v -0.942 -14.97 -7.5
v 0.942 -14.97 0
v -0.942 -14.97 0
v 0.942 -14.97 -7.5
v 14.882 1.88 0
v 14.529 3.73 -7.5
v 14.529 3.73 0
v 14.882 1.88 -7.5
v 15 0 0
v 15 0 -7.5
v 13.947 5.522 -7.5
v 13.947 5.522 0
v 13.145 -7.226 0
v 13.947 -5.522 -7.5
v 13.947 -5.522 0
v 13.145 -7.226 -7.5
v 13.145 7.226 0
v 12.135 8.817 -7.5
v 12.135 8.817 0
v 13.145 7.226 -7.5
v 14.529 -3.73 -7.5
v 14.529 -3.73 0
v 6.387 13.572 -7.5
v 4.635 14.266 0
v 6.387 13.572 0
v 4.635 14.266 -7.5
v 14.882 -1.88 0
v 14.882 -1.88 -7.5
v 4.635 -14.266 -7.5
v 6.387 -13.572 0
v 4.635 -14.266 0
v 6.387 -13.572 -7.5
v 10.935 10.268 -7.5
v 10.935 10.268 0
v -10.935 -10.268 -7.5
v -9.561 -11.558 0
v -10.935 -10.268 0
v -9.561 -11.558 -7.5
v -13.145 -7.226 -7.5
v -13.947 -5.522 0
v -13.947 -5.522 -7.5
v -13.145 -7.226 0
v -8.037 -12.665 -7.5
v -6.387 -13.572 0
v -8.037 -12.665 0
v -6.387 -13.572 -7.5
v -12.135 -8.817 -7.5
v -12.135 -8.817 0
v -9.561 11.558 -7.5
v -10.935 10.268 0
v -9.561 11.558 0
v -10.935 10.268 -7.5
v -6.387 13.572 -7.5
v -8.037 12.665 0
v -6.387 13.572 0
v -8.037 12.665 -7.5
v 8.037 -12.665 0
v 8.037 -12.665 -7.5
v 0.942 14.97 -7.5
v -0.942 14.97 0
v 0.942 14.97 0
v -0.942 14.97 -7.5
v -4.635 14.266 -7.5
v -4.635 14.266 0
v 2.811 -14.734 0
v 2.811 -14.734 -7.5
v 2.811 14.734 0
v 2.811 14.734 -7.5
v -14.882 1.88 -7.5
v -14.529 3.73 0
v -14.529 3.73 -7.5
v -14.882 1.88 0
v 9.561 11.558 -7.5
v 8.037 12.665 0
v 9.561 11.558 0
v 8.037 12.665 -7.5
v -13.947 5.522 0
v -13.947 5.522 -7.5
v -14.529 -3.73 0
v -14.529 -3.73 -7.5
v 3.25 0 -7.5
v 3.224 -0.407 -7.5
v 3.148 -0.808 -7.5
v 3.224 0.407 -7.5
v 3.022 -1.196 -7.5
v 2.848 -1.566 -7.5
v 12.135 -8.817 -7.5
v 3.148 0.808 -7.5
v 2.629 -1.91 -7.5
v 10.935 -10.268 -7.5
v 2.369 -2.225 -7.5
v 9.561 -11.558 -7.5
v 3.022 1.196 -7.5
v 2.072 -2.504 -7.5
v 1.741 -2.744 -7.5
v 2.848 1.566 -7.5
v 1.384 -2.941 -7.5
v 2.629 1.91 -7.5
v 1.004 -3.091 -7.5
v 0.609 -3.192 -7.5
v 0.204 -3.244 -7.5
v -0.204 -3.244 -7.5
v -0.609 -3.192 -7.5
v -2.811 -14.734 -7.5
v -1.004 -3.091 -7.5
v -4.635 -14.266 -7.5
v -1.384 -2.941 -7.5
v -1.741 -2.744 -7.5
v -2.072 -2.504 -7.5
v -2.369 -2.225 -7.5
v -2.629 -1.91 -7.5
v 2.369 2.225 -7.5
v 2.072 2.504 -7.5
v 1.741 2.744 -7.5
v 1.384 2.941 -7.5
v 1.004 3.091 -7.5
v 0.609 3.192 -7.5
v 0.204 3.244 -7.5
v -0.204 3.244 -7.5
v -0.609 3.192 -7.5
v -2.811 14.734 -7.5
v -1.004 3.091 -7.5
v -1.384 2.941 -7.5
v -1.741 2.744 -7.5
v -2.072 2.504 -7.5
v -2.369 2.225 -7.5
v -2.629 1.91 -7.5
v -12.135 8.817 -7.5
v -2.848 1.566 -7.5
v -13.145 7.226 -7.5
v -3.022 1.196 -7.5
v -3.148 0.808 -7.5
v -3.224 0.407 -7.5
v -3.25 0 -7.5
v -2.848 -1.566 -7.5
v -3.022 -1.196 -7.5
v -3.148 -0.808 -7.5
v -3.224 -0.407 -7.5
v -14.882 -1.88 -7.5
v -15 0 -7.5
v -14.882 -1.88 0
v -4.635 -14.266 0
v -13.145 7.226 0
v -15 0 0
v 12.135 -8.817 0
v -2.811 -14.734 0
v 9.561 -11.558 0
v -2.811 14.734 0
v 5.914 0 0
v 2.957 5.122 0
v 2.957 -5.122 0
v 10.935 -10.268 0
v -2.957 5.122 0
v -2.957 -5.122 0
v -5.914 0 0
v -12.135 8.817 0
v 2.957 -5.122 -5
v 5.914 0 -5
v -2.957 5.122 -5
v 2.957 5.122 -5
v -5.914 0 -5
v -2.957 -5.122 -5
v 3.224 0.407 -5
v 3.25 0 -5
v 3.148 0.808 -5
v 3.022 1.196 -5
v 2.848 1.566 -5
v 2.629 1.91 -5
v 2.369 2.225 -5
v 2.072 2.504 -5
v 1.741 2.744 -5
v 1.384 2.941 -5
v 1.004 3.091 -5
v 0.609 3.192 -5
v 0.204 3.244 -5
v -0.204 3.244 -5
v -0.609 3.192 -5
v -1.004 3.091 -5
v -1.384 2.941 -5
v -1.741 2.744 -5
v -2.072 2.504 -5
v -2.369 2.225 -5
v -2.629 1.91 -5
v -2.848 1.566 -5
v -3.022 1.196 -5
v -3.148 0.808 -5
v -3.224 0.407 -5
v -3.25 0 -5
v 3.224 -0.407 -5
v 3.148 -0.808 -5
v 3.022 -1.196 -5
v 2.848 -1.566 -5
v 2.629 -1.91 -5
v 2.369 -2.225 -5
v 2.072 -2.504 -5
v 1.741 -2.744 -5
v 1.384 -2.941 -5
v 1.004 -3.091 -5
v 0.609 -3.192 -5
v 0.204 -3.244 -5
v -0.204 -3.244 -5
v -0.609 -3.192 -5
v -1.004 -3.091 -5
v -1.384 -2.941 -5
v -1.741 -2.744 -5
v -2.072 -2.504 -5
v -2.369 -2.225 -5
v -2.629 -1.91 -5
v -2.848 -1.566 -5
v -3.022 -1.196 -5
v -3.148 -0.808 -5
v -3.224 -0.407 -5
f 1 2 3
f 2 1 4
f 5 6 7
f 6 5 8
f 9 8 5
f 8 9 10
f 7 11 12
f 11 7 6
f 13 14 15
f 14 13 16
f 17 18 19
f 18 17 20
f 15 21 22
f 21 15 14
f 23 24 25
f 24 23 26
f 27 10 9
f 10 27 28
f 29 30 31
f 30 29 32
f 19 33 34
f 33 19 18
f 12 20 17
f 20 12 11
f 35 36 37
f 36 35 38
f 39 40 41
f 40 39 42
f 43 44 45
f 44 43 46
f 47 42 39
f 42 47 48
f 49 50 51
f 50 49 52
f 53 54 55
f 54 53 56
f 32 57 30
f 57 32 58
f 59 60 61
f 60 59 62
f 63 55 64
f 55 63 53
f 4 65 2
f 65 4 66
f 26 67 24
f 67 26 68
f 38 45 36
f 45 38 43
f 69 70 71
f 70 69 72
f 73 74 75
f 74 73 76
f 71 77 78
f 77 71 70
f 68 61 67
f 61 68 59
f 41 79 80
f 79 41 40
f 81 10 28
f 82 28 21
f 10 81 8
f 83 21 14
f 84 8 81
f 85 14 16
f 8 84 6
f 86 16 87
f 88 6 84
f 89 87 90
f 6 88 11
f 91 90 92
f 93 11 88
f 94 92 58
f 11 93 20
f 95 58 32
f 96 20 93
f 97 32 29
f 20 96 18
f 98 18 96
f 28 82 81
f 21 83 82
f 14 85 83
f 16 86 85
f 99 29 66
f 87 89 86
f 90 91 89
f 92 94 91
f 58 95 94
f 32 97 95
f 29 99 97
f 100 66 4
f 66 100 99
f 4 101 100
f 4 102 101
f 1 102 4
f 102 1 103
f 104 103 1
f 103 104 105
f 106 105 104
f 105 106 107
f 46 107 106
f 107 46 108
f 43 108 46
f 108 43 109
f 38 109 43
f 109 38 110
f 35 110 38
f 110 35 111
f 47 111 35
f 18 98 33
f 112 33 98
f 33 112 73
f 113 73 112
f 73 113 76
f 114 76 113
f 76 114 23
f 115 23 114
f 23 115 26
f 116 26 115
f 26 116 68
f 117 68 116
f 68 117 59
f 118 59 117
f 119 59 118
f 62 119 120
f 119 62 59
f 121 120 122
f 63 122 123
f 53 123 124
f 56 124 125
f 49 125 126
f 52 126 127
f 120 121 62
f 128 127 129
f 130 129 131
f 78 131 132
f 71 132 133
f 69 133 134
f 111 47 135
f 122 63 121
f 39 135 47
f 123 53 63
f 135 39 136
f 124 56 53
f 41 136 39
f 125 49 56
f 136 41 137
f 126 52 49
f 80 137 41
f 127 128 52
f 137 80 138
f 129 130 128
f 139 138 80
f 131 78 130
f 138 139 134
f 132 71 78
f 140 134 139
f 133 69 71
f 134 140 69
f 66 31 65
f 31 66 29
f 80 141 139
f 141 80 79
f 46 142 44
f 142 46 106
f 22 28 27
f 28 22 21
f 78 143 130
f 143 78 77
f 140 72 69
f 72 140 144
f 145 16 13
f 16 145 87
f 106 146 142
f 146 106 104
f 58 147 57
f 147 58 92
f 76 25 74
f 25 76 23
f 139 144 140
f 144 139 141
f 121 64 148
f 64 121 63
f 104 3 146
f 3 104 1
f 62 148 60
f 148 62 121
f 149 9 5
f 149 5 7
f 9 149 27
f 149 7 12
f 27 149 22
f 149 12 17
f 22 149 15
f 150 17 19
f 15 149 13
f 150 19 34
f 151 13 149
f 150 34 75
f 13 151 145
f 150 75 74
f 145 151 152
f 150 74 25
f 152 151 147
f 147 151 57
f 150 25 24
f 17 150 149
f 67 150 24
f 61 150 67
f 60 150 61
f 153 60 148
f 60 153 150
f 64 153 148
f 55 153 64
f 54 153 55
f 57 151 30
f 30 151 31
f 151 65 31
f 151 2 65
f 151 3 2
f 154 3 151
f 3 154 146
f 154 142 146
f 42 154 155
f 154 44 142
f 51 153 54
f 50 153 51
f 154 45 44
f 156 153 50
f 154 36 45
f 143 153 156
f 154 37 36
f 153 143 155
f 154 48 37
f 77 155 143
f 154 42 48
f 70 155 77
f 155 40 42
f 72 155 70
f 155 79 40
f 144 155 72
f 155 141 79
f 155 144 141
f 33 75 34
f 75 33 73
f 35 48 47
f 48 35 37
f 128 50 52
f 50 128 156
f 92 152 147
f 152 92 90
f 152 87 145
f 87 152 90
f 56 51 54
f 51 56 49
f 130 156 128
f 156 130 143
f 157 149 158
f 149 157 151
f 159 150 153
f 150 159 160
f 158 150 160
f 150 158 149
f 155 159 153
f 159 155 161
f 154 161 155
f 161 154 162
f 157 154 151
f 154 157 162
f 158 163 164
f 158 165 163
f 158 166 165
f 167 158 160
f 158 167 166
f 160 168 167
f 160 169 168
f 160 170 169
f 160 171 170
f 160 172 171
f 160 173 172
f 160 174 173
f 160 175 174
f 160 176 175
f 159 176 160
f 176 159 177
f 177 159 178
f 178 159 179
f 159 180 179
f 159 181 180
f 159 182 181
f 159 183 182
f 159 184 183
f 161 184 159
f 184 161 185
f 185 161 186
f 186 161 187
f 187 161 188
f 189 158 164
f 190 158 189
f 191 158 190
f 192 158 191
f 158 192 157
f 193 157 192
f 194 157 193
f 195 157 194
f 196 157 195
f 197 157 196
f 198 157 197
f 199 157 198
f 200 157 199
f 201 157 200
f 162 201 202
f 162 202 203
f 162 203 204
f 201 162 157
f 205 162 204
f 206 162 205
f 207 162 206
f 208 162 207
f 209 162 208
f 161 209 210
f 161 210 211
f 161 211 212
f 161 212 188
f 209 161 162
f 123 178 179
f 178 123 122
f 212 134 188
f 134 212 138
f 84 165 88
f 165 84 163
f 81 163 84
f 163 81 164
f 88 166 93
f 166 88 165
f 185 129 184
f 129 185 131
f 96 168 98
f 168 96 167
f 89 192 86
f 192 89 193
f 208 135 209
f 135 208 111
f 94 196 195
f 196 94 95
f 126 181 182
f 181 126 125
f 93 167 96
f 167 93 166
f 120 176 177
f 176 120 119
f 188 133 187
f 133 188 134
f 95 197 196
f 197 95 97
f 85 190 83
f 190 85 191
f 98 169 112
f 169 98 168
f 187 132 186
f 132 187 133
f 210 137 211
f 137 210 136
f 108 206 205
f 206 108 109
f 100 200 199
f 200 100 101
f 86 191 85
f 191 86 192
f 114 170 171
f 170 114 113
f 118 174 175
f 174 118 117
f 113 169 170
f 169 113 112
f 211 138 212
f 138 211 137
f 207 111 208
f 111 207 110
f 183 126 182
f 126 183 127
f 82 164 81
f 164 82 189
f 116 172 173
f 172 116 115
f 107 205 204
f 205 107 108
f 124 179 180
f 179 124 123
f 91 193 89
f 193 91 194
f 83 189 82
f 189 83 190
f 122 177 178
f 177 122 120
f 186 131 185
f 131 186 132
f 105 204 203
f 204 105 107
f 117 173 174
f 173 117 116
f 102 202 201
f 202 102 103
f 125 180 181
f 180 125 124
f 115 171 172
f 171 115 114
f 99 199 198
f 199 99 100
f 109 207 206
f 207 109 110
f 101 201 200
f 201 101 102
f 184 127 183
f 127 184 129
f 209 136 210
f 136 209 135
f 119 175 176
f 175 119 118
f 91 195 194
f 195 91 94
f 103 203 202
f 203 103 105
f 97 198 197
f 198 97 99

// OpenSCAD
$fn = 50;


difference() {
	union() {
		translate(v = [0, 0, -7.5000000000]) {
			cylinder(h = 7.5000000000, r = 15.0000000000);
		}
		translate(v = [0, 0, -6.0000000000]) {
			cylinder(h = 6, r = 2.8750000000);
		}
	}
	union() {
		translate(v = [0, 0, 0]) {
			rotate(a = [0, 0, 0]) {
				difference() {
					union() {
						translate(v = [0, 0, -5]) {
							linear_extrude(height = 5) {
								polygon(points = [[5.9142500000, 0.0000000000], [2.9571250000, 5.1218907443], [-2.9571250000, 5.1218907443], [-5.9142500000, 0.0000000000], [-2.9571250000, -5.1218907443], [2.9571250000, -5.1218907443]]);
							}
						}
					}
					union();
				}
			}
		}
		#translate(v = [0, 0, -100.0000000000]) {
			cylinder(h = 200, r = 3.2500000000);
		}
	}
}
